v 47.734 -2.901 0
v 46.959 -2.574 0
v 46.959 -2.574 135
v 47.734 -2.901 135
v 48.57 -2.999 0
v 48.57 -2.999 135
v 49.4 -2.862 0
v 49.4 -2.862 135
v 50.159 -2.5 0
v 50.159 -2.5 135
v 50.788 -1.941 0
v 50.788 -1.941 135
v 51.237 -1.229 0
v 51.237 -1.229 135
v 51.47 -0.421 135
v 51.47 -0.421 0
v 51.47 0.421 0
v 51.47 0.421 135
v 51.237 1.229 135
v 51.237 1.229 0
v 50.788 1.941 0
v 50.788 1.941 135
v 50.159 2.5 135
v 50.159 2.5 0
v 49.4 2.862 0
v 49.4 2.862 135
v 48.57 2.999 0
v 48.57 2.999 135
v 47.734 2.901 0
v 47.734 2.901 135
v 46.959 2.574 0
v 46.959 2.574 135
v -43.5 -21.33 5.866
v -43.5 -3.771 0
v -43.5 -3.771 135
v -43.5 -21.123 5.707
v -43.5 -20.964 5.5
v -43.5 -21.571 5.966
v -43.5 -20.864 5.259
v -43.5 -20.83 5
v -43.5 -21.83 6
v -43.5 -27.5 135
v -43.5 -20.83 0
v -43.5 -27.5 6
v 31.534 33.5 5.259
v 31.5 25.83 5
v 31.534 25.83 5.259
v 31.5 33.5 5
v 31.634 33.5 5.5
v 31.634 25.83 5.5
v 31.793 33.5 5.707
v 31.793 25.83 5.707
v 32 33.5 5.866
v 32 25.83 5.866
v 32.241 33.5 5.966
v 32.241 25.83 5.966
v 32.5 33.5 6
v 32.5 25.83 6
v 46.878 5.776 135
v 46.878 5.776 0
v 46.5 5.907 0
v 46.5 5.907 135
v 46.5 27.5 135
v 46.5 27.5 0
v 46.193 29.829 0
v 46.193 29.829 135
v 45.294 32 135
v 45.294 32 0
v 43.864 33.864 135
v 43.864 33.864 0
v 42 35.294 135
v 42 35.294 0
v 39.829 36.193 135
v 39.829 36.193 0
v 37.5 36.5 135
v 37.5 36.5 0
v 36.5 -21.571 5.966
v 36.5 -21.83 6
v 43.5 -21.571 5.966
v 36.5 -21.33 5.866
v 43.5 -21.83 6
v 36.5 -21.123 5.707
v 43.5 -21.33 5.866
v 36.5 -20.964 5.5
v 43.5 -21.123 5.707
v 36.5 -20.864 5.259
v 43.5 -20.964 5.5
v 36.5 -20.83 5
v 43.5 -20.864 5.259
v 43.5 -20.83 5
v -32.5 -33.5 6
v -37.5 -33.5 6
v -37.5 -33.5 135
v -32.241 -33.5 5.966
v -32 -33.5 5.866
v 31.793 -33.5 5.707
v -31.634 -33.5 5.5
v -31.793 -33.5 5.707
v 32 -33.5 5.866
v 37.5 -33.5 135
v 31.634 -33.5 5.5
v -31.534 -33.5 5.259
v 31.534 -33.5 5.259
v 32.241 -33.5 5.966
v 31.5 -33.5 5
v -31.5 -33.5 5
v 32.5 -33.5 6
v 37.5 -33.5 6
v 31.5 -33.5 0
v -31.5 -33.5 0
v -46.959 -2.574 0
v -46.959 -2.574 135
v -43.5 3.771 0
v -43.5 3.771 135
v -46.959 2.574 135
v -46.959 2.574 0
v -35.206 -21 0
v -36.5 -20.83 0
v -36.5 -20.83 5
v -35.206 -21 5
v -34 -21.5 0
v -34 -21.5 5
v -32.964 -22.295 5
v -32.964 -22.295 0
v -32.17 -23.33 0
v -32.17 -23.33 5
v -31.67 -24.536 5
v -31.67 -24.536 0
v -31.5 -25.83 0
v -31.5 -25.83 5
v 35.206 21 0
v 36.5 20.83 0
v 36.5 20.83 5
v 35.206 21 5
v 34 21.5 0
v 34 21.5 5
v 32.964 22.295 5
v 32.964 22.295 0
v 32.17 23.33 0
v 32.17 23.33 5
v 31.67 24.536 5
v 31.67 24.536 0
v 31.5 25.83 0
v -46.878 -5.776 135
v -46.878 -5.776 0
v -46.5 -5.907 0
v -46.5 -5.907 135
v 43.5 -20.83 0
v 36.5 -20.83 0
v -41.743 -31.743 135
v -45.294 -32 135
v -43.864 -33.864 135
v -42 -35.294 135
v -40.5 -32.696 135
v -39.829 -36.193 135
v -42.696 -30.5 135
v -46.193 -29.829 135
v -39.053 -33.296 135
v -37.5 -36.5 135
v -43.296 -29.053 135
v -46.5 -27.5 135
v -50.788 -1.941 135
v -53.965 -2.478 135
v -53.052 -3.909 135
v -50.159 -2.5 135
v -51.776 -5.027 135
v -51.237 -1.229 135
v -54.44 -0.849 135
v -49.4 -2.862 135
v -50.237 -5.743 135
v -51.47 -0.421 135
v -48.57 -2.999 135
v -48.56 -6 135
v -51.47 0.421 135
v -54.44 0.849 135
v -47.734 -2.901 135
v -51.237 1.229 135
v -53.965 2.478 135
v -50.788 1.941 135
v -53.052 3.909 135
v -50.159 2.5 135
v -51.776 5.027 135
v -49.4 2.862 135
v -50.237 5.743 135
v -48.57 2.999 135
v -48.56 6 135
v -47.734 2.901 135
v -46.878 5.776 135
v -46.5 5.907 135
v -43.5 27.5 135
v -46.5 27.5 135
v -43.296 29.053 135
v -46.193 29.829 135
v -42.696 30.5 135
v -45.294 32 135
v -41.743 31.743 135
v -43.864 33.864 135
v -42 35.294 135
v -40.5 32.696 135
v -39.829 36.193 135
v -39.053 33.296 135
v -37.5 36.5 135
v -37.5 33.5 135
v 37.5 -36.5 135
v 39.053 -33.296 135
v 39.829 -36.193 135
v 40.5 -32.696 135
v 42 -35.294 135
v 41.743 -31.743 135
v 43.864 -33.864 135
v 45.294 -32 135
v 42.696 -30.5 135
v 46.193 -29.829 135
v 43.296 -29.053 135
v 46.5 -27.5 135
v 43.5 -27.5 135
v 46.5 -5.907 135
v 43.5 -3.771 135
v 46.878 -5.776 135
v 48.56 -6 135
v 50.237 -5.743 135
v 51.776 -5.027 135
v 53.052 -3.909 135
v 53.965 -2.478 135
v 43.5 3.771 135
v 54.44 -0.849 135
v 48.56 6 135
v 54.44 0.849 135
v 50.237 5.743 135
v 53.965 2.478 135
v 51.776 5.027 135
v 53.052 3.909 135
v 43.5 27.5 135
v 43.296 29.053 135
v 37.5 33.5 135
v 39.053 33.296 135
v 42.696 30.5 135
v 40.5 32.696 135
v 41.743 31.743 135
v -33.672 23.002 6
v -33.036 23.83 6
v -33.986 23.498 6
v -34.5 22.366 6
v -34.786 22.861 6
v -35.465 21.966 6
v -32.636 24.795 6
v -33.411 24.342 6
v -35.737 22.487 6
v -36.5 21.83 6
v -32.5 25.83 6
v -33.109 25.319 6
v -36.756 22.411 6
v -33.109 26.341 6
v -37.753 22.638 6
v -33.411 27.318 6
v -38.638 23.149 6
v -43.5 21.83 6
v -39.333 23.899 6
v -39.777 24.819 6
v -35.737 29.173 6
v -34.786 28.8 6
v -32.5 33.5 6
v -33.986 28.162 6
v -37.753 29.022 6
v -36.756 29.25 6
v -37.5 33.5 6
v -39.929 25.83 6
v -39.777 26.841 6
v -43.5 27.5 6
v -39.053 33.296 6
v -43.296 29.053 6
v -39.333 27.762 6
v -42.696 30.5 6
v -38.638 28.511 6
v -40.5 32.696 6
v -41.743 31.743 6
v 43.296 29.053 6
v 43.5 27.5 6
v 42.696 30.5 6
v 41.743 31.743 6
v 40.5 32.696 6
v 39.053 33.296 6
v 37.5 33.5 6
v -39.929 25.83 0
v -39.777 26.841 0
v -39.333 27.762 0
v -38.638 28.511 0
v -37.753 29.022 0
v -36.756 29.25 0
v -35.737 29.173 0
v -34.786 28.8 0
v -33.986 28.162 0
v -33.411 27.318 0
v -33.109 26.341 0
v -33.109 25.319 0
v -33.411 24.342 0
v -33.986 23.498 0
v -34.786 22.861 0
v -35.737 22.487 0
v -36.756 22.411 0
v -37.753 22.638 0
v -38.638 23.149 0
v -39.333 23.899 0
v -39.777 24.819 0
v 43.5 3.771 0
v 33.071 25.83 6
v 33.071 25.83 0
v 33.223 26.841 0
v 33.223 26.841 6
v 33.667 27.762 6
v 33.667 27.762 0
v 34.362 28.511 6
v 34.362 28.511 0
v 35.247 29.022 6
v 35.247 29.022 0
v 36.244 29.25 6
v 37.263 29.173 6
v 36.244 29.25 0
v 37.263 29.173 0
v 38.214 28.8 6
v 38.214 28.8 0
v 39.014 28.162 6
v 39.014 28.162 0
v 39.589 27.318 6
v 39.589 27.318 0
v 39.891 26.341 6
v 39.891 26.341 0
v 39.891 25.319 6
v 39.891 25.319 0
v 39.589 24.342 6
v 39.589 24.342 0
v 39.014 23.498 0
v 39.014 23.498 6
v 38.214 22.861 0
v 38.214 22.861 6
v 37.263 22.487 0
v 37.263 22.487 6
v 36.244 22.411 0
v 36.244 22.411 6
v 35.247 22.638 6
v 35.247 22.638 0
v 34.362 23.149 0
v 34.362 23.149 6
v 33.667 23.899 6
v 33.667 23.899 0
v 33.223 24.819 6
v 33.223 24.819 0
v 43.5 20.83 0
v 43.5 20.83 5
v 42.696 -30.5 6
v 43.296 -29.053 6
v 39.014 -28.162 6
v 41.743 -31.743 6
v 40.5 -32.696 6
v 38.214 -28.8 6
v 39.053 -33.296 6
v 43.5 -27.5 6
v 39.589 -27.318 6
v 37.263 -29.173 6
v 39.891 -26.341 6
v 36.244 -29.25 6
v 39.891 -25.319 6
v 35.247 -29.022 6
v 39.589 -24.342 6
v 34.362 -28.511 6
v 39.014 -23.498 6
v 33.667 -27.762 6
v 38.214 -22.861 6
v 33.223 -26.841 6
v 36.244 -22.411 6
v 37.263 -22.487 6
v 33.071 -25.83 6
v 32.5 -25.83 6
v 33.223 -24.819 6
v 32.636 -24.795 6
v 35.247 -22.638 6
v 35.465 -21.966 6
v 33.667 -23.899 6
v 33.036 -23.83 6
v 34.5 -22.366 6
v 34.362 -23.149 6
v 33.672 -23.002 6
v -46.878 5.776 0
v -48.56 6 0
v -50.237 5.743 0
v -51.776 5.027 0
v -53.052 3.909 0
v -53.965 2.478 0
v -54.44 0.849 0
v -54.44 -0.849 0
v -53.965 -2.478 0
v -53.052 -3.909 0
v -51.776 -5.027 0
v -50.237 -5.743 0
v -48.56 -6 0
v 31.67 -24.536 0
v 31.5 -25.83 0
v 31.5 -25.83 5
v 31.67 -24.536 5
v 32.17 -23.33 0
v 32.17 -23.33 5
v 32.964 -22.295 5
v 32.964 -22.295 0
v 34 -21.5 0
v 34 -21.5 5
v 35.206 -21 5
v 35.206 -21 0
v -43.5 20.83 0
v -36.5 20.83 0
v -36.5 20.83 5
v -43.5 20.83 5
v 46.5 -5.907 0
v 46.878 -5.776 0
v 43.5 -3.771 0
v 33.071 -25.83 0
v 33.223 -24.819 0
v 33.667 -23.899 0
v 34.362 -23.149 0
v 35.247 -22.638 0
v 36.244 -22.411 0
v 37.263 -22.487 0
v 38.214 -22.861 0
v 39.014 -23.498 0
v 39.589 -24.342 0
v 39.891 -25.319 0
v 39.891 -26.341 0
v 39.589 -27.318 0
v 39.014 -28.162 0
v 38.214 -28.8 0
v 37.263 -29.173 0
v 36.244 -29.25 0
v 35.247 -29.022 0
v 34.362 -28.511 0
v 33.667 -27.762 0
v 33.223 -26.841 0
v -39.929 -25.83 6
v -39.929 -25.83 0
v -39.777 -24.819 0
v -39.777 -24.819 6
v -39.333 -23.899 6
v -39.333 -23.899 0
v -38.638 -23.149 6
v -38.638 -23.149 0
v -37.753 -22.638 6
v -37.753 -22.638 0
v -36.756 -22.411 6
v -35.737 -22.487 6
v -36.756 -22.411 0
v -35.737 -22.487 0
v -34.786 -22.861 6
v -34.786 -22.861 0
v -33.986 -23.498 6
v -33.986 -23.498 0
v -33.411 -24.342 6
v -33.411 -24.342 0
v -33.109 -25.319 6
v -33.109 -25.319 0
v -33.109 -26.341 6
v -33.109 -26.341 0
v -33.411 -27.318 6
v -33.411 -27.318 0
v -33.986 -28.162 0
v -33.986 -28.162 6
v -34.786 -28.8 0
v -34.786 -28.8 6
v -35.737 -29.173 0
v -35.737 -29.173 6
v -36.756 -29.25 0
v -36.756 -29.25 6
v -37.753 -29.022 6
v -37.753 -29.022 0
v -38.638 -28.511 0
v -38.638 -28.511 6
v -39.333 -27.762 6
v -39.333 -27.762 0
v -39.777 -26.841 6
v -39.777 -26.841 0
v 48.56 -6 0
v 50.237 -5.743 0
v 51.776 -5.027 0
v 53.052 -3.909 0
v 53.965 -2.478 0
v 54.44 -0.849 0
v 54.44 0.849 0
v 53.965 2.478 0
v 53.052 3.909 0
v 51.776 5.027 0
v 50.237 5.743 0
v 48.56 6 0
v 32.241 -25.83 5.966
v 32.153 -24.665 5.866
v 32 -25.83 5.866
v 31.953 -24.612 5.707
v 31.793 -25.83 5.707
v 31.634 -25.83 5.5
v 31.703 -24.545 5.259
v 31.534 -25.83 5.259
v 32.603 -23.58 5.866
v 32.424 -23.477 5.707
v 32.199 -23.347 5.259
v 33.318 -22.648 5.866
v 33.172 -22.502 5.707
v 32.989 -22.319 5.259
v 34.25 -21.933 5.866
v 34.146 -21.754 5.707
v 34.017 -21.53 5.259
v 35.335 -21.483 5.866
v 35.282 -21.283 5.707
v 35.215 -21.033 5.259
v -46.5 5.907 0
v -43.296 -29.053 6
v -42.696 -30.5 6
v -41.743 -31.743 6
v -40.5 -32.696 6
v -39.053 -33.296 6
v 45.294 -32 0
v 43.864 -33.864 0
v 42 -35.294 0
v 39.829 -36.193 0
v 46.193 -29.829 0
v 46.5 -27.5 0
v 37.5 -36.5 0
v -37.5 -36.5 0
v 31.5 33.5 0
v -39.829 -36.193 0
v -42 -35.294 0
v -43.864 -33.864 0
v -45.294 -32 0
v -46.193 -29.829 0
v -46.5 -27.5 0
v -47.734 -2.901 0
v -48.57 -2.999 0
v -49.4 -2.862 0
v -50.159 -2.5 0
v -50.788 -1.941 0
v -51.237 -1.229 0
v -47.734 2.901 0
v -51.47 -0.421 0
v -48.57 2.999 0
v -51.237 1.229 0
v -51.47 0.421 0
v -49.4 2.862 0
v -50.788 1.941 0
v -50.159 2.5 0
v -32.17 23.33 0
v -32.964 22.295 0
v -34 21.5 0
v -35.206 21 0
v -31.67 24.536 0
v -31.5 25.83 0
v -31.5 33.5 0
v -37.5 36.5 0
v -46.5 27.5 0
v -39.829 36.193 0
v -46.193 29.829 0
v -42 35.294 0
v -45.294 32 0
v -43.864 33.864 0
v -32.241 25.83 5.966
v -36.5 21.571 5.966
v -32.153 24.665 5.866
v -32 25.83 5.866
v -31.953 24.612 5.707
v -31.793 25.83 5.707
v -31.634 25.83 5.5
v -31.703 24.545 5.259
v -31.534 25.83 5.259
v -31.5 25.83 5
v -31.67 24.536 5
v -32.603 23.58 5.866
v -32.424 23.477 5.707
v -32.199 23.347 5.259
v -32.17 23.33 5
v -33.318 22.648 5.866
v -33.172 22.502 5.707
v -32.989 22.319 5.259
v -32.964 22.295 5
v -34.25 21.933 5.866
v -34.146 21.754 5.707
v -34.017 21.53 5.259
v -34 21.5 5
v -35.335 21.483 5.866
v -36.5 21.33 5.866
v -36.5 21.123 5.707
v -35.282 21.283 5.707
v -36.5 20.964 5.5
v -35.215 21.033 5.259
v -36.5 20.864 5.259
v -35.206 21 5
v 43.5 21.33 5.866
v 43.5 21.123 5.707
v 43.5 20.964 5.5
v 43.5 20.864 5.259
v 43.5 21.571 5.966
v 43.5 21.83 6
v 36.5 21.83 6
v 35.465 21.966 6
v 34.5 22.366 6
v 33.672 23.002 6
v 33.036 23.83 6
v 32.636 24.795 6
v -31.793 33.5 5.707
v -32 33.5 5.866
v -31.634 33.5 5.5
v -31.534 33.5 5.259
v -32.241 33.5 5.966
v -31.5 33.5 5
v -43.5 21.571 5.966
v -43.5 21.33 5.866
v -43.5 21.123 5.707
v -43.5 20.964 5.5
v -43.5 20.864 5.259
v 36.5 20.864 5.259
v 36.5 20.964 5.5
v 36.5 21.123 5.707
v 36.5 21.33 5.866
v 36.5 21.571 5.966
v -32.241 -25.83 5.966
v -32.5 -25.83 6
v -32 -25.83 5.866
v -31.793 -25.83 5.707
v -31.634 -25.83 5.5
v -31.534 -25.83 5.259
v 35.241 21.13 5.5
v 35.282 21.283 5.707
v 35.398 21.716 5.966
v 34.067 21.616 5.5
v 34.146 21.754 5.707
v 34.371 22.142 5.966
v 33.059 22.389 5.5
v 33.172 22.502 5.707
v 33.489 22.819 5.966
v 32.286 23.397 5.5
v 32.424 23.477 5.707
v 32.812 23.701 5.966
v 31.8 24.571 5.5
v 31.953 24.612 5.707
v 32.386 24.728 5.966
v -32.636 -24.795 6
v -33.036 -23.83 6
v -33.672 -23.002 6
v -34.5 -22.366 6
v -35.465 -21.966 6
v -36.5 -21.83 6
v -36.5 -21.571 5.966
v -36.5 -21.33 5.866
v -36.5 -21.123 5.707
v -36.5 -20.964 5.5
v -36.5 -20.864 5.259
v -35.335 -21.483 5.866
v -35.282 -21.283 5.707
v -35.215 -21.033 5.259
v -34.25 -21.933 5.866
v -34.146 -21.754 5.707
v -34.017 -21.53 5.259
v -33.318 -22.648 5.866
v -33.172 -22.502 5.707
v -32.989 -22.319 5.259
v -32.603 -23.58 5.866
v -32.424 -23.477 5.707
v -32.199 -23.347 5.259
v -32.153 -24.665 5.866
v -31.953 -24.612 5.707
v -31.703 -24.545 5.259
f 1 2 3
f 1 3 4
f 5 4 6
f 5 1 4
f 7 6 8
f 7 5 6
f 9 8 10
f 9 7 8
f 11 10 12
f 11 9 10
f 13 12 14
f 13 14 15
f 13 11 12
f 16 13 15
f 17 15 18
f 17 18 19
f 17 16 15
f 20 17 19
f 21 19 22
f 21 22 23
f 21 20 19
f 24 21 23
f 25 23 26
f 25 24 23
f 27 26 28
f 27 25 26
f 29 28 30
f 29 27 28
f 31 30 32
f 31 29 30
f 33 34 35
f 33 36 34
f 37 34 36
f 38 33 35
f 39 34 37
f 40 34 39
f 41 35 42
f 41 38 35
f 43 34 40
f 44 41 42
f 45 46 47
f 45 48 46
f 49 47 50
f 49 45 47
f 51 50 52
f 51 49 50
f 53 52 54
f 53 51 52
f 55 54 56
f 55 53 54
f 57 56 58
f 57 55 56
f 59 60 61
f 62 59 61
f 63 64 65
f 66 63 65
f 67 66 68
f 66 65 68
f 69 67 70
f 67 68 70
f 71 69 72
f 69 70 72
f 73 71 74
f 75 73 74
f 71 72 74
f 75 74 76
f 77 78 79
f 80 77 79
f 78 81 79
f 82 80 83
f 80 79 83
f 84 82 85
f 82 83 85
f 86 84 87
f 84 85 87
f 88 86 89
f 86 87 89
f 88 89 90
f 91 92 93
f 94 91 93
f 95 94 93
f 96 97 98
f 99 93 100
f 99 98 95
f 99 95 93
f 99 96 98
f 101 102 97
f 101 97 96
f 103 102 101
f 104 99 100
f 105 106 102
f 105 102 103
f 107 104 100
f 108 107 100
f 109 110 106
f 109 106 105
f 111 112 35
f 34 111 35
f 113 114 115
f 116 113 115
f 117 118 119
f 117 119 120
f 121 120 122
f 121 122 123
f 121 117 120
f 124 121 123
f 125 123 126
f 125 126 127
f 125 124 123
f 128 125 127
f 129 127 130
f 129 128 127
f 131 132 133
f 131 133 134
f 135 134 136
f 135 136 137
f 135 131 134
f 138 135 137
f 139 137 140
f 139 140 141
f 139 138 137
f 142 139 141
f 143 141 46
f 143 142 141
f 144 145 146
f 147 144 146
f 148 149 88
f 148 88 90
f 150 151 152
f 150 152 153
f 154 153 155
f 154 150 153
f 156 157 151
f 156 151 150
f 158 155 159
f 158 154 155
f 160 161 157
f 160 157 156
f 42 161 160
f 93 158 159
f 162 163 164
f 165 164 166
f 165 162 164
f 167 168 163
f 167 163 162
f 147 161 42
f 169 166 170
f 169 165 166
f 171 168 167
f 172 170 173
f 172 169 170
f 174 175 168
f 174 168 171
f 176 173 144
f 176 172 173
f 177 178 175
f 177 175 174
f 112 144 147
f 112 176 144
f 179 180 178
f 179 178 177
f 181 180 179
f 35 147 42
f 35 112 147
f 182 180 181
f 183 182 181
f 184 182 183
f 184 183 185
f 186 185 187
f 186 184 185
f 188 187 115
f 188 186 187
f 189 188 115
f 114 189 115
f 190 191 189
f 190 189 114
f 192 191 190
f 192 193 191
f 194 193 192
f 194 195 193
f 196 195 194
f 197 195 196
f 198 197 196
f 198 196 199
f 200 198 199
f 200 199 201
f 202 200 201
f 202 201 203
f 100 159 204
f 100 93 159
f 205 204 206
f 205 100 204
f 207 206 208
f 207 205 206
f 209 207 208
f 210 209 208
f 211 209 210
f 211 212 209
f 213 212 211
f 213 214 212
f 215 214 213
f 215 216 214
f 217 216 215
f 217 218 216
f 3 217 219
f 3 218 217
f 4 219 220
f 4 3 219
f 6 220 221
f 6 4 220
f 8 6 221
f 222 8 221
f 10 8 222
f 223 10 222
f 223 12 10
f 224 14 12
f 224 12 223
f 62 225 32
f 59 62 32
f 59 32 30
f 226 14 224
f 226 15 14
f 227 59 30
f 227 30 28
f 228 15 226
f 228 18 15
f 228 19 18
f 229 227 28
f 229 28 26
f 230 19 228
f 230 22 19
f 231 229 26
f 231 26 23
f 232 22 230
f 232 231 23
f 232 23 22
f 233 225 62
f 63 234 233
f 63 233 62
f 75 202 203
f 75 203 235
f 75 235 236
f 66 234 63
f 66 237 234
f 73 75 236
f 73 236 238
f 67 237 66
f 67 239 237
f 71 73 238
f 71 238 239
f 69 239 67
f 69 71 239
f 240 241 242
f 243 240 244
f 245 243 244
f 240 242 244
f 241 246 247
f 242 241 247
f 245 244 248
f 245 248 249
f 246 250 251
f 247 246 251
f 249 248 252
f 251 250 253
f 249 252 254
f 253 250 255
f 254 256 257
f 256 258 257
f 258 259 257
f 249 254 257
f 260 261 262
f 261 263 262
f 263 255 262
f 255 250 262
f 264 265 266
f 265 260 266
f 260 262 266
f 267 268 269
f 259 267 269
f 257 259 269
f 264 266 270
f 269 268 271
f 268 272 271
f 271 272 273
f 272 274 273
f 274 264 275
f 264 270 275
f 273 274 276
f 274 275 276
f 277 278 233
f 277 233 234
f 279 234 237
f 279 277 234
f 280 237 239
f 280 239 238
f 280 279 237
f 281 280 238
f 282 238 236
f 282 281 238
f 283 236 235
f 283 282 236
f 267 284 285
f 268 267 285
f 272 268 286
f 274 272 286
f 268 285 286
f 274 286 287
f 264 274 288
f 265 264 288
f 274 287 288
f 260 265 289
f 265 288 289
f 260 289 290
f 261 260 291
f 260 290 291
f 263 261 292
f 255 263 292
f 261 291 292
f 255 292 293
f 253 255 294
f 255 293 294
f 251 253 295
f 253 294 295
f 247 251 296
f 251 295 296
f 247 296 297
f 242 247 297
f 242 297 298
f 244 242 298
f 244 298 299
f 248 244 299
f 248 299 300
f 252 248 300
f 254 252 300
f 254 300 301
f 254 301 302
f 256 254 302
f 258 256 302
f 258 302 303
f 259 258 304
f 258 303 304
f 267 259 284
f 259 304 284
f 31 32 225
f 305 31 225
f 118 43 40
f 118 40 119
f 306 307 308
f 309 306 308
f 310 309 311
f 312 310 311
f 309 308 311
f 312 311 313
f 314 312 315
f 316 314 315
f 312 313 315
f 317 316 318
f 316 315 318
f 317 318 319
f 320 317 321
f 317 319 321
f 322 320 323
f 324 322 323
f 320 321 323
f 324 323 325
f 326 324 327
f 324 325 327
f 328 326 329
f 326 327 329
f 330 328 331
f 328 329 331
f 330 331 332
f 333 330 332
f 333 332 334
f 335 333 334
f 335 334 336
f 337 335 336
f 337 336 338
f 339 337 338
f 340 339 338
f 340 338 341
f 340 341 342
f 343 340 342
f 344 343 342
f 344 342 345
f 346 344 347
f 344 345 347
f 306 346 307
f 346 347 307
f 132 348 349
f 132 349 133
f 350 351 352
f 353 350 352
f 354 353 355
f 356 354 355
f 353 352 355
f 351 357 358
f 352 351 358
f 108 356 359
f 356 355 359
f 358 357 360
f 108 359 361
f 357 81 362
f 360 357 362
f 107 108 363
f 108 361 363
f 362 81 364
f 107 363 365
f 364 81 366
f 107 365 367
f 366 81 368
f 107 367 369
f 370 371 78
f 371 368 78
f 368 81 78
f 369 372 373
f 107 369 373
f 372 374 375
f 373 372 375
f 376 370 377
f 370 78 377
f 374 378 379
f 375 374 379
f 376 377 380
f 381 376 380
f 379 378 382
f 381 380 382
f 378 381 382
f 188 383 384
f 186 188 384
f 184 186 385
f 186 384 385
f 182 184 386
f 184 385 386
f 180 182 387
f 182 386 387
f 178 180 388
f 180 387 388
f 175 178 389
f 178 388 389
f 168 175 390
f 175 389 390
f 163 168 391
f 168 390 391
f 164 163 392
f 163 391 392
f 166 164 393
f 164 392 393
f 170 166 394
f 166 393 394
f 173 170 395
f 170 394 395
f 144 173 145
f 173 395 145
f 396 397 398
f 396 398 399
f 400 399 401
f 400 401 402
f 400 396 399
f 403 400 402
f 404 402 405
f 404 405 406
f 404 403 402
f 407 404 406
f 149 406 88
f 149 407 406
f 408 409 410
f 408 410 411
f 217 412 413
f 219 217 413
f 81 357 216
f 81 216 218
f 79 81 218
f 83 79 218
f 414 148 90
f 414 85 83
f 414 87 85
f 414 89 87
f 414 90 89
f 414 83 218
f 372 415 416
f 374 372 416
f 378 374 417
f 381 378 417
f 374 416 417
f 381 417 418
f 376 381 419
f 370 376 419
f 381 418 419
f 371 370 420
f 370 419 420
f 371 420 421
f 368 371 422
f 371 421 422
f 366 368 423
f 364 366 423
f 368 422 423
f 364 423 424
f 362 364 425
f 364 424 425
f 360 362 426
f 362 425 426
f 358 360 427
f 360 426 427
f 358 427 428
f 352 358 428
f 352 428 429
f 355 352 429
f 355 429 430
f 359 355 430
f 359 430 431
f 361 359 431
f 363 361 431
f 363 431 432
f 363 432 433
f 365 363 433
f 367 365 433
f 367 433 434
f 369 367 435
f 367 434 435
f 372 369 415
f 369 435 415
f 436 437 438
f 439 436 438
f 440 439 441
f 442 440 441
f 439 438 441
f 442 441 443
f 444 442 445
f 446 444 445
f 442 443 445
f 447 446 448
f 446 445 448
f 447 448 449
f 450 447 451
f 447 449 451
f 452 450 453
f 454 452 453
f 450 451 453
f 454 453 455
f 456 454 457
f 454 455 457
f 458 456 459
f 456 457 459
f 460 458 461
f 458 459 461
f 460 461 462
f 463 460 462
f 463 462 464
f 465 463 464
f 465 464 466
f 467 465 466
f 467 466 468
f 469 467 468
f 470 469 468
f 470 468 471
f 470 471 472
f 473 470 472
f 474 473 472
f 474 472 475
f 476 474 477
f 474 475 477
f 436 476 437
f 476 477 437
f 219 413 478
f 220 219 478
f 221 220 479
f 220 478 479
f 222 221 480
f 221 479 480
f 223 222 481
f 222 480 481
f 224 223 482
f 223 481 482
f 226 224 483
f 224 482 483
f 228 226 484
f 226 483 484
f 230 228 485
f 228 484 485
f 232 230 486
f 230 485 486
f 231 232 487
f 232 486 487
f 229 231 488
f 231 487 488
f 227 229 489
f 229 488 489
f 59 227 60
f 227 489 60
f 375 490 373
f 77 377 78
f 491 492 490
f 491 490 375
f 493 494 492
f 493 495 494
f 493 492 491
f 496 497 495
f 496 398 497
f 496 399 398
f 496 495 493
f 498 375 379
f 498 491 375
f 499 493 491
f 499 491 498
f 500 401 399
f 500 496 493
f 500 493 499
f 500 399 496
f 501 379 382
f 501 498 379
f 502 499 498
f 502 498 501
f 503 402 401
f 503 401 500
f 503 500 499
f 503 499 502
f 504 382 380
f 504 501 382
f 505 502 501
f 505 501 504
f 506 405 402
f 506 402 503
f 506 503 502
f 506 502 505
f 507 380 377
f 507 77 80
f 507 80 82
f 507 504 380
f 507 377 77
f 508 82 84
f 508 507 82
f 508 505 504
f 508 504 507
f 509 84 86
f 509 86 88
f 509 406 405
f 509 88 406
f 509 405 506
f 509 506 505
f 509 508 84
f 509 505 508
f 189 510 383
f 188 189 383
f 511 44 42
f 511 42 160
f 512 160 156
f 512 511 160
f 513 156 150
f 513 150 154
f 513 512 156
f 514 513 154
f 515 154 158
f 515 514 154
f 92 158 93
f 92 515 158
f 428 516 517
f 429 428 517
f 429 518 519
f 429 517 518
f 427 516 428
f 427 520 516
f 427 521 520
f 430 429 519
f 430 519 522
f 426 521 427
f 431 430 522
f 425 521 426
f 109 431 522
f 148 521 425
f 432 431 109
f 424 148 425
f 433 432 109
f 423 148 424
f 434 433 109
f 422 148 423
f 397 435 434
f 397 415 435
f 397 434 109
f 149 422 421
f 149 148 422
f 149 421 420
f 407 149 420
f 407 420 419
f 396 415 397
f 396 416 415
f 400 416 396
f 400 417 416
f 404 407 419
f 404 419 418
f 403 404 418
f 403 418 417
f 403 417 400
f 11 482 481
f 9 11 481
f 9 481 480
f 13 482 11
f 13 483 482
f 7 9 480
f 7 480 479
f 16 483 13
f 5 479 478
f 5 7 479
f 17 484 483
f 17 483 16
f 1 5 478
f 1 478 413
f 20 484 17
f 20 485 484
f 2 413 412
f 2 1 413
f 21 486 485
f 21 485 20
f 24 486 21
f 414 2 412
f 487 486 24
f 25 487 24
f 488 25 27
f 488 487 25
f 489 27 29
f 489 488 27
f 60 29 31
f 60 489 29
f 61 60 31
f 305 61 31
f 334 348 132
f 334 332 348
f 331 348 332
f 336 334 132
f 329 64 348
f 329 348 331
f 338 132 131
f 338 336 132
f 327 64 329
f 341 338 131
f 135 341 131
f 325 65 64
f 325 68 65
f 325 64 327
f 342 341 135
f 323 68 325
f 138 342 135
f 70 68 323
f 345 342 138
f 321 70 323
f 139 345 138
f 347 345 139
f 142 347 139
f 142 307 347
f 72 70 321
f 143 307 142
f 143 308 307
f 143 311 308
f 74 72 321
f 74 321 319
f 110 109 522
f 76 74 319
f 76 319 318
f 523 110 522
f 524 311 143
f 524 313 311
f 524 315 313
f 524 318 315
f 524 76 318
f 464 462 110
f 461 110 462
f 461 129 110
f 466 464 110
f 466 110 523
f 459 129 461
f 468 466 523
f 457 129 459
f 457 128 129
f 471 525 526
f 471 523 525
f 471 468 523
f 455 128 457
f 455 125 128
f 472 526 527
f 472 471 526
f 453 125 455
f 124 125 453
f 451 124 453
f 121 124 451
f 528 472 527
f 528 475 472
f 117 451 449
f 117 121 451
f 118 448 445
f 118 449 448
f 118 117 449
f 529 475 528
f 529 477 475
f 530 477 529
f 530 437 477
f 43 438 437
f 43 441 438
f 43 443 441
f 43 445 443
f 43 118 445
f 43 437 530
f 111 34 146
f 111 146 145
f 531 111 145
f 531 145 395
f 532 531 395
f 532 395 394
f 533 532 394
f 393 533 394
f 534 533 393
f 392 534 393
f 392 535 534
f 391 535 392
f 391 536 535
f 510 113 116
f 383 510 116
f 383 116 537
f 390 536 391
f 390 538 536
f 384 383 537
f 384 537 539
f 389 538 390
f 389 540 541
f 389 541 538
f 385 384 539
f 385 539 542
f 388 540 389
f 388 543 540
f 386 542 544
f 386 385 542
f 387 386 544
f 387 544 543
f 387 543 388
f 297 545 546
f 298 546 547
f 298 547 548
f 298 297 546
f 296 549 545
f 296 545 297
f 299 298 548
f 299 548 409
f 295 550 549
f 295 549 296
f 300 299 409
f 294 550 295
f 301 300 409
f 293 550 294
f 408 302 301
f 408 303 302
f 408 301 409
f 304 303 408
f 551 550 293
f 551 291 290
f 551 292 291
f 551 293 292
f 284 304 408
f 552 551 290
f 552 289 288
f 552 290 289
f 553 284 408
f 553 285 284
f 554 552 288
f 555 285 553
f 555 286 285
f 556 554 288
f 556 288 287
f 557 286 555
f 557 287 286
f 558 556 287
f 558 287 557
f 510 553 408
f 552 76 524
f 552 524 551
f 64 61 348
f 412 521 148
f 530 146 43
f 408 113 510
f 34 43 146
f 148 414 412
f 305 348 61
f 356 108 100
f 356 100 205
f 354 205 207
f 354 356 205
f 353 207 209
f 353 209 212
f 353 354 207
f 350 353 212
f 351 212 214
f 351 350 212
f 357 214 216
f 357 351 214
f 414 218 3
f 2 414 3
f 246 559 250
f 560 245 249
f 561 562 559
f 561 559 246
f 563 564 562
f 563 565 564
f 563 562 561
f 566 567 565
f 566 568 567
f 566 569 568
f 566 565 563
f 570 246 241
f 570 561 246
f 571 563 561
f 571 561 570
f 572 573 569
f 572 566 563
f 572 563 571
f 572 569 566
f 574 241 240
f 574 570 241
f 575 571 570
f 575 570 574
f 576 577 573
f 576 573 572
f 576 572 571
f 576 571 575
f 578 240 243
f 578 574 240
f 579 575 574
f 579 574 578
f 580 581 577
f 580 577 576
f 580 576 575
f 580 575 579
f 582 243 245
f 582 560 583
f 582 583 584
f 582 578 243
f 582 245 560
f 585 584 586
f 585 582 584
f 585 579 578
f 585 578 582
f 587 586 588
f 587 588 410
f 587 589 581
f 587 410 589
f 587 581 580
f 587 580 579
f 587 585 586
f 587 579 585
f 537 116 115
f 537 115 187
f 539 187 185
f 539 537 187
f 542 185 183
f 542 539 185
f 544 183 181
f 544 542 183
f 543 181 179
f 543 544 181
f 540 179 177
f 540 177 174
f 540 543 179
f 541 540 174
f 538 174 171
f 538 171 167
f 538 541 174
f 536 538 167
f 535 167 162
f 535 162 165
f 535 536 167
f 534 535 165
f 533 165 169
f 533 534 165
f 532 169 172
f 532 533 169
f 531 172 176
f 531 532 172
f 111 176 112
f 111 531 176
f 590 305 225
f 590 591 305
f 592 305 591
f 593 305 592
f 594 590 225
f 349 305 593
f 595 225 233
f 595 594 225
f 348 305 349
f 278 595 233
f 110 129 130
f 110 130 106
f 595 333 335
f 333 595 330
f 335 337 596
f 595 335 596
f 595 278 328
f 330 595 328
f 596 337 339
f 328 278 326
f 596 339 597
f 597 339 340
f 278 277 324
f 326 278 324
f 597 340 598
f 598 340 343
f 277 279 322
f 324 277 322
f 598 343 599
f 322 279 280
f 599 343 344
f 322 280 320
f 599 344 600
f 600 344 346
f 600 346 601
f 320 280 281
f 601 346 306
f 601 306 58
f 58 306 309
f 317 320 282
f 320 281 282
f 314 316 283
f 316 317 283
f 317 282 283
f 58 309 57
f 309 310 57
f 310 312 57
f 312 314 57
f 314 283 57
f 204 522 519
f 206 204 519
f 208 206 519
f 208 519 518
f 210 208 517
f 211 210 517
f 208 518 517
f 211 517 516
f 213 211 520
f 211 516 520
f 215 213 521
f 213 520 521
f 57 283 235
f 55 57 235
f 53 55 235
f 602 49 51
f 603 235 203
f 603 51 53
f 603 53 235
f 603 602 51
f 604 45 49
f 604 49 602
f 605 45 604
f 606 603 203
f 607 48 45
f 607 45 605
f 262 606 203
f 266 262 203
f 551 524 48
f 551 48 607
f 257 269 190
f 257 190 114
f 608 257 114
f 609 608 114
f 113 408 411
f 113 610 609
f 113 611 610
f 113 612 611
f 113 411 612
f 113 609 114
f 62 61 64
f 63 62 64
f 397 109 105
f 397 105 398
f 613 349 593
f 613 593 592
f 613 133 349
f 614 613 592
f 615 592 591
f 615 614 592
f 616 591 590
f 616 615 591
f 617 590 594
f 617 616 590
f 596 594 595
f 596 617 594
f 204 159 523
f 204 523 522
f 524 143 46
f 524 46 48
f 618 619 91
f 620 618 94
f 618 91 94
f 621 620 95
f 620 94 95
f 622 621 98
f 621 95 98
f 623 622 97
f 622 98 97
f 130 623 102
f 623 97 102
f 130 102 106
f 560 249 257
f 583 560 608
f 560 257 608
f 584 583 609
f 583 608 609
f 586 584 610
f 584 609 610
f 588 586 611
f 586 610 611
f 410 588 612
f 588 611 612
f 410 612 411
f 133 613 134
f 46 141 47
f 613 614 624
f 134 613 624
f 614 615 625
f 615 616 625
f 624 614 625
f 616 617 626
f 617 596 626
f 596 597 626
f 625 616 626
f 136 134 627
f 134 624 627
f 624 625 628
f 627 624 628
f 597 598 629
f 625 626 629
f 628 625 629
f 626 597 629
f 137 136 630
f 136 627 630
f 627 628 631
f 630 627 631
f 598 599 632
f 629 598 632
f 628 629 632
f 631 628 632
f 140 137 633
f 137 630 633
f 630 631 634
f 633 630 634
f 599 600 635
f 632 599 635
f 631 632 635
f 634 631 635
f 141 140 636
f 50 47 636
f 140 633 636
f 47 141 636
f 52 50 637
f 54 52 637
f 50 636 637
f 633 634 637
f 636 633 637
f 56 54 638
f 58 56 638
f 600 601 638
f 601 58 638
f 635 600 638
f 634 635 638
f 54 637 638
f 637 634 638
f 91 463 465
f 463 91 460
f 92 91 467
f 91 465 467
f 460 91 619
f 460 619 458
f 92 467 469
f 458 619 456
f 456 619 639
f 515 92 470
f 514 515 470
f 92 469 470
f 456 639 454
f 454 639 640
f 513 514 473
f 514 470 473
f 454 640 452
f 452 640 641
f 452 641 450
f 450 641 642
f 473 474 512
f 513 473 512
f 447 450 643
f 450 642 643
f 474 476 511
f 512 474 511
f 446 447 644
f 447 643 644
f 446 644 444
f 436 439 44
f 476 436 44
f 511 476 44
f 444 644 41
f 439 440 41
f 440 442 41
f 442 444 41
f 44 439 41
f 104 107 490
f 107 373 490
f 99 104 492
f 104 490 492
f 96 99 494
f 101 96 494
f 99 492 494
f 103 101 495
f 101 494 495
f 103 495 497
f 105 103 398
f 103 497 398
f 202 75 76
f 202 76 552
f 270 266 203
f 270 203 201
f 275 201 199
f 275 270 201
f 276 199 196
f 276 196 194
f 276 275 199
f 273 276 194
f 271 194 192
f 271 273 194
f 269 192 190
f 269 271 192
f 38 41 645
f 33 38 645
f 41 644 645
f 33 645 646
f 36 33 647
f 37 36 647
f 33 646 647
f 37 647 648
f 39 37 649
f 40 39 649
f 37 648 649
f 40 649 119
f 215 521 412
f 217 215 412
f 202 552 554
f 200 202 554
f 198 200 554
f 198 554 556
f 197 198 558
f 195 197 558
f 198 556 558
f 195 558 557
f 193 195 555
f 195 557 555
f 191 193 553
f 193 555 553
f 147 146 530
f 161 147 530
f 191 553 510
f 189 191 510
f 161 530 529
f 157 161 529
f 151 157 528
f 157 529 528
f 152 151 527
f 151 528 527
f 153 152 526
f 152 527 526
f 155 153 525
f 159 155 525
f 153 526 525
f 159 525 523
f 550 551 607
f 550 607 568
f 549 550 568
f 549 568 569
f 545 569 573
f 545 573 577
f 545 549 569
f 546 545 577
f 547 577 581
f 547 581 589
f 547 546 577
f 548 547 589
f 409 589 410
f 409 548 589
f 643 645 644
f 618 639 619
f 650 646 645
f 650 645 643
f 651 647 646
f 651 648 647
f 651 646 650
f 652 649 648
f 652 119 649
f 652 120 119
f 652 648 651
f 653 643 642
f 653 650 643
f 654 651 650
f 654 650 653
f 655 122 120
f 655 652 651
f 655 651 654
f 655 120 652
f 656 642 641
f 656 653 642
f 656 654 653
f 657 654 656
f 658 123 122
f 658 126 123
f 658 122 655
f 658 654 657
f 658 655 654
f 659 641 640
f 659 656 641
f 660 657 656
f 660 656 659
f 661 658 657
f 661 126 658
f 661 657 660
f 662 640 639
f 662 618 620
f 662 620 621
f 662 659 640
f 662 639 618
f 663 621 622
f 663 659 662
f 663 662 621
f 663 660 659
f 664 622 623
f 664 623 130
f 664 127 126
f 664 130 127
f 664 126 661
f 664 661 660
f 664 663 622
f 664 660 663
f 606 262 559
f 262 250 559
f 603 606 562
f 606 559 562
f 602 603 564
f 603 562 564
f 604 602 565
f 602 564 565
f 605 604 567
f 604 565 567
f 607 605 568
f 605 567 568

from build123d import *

# Parameters (mm, degrees)
EXTRUDE_THIN1_DEPTH = 135
SKETCH6_R           = 3.429
BOSS_EXTRUDE1_DEPTH = 6
FILLET1_R           = 1


with BuildPart() as part:
    # Sketch4 → Extrude-Thin1 (new body)
    with BuildSketch(Plane.XY):
        with BuildLine():
            Line((-46.5, 27.5), (-46.5, 5.907156632))
            Line((-46.5, 5.907156632), (-46.877529279, 5.776468537))
            ThreePointArc((-46.877529279, 5.776468537), (-54.5, 0), (-46.877529279, -5.776468537))
            Line((-46.877529279, -5.776468537), (-46.5, -5.907156632))
            Line((-46.5, -5.907156632), (-46.5, -27.5))
            ThreePointArc((-46.5, -27.5), (-43.863961031, -33.863961031), (-37.5, -36.5))
            Line((-37.5, -36.5), (37.5, -36.5))
            ThreePointArc((37.5, -36.5), (43.863961031, -33.863961031), (46.5, -27.5))
            Line((46.5, -27.5), (46.5, -5.907156632))
            Line((46.5, -5.907156632), (46.877529279, -5.776468537))
            ThreePointArc((46.877529279, -5.776468537), (54.5, 0), (46.877529279, 5.776468537))
            Line((46.877529279, 5.776468537), (46.5, 5.907156632))
            Line((46.5, 5.907156632), (46.5, 27.5))
            ThreePointArc((46.5, 27.5), (43.863961031, 33.863961031), (37.5, 36.5))
            Line((37.5, 36.5), (-37.5, 36.5))
            ThreePointArc((-37.5, 36.5), (-43.863961031, 33.863961031), (-46.5, 27.5))
        make_face()
        with BuildLine():
            Line((-43.5, 27.5), (-43.5, 3.770994321))
            Line((-43.5, 3.770994321), (-46.9586126, 2.573737532))
            ThreePointArc((-46.9586126, 2.573737532), (-51.5, 0), (-46.9586126, -2.573737532))
            Line((-46.9586126, -2.573737532), (-43.5, -3.770994321))
            Line((-43.5, -3.770994321), (-43.5, -27.5))
            ThreePointArc((-43.5, -27.5), (-41.742640687, -31.742640687), (-37.5, -33.5))
            Line((-37.5, -33.5), (37.5, -33.5))
            ThreePointArc((37.5, -33.5), (41.742640687, -31.742640687), (43.5, -27.5))
            Line((43.5, -27.5), (43.5, -3.770994321))
            Line((43.5, -3.770994321), (46.9586126, -2.573737532))
            ThreePointArc((46.9586126, -2.573737532), (51.5, 0), (46.9586126, 2.573737532))
            Line((46.9586126, 2.573737532), (43.5, 3.770994321))
            Line((43.5, 3.770994321), (43.5, 27.5))
            ThreePointArc((43.5, 27.5), (41.742640687, 31.742640687), (37.5, 33.5))
            Line((37.5, 33.5), (-37.5, 33.5))
            ThreePointArc((-37.5, 33.5), (-41.742640687, 31.742640687), (-43.5, 27.5))
        make_face(mode=Mode.SUBTRACT)
    extrude(amount=EXTRUDE_THIN1_DEPTH)

    # Sketch6 → Boss-Extrude1 (add)
    with BuildSketch(Plane(origin=(0, 0, 0), x_dir=(-1, 0, 0), z_dir=(0, 0, -1))):
        with BuildLine():
            Line((-31.5, 25.830127019), (-31.5, 33.5))
            Line((-31.5, 33.5), (-37.5, 33.5))
            ThreePointArc((-37.5, 33.5), (-41.742640687, 31.742640687), (-43.5, 27.5))
            Line((-43.5, 27.5), (-43.5, 20.830127019))
            Line((-43.5, 20.830127019), (-36.5, 20.830127019))
            ThreePointArc((-36.5, 20.830127019), (-32.964466094, 22.294593113), (-31.5, 25.830127019))
        make_face()
        with Locations((-36.5, 25.830127019)):
            Circle(SKETCH6_R, mode=Mode.SUBTRACT)
        with BuildLine():
            Line((37.5, 33.5), (31.5, 33.5))
            Line((31.5, 33.5), (31.5, 25.830127019))
            ThreePointArc((31.5, 25.830127019), (32.964466094, 22.294593113), (36.5, 20.830127019))
            Line((36.5, 20.830127019), (43.5, 20.830127019))
            Line((43.5, 20.830127019), (43.5, 27.5))
            ThreePointArc((43.5, 27.5), (41.742640687, 31.742640687), (37.5, 33.5))
        make_face()
        with Locations((36.5, 25.830127019)):
            Circle(SKETCH6_R, mode=Mode.SUBTRACT)
        with BuildLine():
            Line((31.5, -25.830127019), (31.5, -33.5))
            Line((31.5, -33.5), (37.5, -33.5))
            ThreePointArc((37.5, -33.5), (41.742640687, -31.742640687), (43.5, -27.5))
            Line((43.5, -27.5), (43.5, -20.830127019))
            Line((43.5, -20.830127019), (36.5, -20.830127019))
            ThreePointArc((36.5, -20.830127019), (32.964466094, -22.294593113), (31.5, -25.830127019))
        make_face()
        with Locations((36.5, -25.830127019)):
            Circle(SKETCH6_R, mode=Mode.SUBTRACT)
        with BuildLine():
            Line((-37.5, -33.5), (-31.5, -33.5))
            Line((-31.5, -33.5), (-31.5, -25.830127019))
            ThreePointArc((-31.5, -25.830127019), (-32.964466094, -22.294593113), (-36.5, -20.830127019))
            Line((-36.5, -20.830127019), (-43.5, -20.830127019))
            Line((-43.5, -20.830127019), (-43.5, -27.5))
            ThreePointArc((-43.5, -27.5), (-41.742640687, -31.742640687), (-37.5, -33.5))
        make_face()
        with Locations((-36.5, -25.830127019)):
            Circle(SKETCH6_R, mode=Mode.SUBTRACT)
    extrude(amount=-BOSS_EXTRUDE1_DEPTH)

    # Fillet1
    fillet1_edges = [part.edges().sort_by_distance(p)[0] for p in [
        (-40, 20.830127019, 6),
        (-32.964466094, 22.294593113, 6),
        (-31.5, 29.665063509, 6),
        (-32.964466094, -22.294593113, 6),
        (-40, -20.830127019, 6),
        (-31.5, -29.665063509, 6),
        (40, -20.830127019, 6),
        (32.964466094, -22.294593113, 6),
        (31.5, -29.665063509, 6),
        (32.964466094, 22.294593113, 6),
        (40, 20.830127019, 6),
        (31.5, 29.665063509, 6),
    ]]
    fillet(fillet1_edges, radius=FILLET1_R)


solid = part.part
